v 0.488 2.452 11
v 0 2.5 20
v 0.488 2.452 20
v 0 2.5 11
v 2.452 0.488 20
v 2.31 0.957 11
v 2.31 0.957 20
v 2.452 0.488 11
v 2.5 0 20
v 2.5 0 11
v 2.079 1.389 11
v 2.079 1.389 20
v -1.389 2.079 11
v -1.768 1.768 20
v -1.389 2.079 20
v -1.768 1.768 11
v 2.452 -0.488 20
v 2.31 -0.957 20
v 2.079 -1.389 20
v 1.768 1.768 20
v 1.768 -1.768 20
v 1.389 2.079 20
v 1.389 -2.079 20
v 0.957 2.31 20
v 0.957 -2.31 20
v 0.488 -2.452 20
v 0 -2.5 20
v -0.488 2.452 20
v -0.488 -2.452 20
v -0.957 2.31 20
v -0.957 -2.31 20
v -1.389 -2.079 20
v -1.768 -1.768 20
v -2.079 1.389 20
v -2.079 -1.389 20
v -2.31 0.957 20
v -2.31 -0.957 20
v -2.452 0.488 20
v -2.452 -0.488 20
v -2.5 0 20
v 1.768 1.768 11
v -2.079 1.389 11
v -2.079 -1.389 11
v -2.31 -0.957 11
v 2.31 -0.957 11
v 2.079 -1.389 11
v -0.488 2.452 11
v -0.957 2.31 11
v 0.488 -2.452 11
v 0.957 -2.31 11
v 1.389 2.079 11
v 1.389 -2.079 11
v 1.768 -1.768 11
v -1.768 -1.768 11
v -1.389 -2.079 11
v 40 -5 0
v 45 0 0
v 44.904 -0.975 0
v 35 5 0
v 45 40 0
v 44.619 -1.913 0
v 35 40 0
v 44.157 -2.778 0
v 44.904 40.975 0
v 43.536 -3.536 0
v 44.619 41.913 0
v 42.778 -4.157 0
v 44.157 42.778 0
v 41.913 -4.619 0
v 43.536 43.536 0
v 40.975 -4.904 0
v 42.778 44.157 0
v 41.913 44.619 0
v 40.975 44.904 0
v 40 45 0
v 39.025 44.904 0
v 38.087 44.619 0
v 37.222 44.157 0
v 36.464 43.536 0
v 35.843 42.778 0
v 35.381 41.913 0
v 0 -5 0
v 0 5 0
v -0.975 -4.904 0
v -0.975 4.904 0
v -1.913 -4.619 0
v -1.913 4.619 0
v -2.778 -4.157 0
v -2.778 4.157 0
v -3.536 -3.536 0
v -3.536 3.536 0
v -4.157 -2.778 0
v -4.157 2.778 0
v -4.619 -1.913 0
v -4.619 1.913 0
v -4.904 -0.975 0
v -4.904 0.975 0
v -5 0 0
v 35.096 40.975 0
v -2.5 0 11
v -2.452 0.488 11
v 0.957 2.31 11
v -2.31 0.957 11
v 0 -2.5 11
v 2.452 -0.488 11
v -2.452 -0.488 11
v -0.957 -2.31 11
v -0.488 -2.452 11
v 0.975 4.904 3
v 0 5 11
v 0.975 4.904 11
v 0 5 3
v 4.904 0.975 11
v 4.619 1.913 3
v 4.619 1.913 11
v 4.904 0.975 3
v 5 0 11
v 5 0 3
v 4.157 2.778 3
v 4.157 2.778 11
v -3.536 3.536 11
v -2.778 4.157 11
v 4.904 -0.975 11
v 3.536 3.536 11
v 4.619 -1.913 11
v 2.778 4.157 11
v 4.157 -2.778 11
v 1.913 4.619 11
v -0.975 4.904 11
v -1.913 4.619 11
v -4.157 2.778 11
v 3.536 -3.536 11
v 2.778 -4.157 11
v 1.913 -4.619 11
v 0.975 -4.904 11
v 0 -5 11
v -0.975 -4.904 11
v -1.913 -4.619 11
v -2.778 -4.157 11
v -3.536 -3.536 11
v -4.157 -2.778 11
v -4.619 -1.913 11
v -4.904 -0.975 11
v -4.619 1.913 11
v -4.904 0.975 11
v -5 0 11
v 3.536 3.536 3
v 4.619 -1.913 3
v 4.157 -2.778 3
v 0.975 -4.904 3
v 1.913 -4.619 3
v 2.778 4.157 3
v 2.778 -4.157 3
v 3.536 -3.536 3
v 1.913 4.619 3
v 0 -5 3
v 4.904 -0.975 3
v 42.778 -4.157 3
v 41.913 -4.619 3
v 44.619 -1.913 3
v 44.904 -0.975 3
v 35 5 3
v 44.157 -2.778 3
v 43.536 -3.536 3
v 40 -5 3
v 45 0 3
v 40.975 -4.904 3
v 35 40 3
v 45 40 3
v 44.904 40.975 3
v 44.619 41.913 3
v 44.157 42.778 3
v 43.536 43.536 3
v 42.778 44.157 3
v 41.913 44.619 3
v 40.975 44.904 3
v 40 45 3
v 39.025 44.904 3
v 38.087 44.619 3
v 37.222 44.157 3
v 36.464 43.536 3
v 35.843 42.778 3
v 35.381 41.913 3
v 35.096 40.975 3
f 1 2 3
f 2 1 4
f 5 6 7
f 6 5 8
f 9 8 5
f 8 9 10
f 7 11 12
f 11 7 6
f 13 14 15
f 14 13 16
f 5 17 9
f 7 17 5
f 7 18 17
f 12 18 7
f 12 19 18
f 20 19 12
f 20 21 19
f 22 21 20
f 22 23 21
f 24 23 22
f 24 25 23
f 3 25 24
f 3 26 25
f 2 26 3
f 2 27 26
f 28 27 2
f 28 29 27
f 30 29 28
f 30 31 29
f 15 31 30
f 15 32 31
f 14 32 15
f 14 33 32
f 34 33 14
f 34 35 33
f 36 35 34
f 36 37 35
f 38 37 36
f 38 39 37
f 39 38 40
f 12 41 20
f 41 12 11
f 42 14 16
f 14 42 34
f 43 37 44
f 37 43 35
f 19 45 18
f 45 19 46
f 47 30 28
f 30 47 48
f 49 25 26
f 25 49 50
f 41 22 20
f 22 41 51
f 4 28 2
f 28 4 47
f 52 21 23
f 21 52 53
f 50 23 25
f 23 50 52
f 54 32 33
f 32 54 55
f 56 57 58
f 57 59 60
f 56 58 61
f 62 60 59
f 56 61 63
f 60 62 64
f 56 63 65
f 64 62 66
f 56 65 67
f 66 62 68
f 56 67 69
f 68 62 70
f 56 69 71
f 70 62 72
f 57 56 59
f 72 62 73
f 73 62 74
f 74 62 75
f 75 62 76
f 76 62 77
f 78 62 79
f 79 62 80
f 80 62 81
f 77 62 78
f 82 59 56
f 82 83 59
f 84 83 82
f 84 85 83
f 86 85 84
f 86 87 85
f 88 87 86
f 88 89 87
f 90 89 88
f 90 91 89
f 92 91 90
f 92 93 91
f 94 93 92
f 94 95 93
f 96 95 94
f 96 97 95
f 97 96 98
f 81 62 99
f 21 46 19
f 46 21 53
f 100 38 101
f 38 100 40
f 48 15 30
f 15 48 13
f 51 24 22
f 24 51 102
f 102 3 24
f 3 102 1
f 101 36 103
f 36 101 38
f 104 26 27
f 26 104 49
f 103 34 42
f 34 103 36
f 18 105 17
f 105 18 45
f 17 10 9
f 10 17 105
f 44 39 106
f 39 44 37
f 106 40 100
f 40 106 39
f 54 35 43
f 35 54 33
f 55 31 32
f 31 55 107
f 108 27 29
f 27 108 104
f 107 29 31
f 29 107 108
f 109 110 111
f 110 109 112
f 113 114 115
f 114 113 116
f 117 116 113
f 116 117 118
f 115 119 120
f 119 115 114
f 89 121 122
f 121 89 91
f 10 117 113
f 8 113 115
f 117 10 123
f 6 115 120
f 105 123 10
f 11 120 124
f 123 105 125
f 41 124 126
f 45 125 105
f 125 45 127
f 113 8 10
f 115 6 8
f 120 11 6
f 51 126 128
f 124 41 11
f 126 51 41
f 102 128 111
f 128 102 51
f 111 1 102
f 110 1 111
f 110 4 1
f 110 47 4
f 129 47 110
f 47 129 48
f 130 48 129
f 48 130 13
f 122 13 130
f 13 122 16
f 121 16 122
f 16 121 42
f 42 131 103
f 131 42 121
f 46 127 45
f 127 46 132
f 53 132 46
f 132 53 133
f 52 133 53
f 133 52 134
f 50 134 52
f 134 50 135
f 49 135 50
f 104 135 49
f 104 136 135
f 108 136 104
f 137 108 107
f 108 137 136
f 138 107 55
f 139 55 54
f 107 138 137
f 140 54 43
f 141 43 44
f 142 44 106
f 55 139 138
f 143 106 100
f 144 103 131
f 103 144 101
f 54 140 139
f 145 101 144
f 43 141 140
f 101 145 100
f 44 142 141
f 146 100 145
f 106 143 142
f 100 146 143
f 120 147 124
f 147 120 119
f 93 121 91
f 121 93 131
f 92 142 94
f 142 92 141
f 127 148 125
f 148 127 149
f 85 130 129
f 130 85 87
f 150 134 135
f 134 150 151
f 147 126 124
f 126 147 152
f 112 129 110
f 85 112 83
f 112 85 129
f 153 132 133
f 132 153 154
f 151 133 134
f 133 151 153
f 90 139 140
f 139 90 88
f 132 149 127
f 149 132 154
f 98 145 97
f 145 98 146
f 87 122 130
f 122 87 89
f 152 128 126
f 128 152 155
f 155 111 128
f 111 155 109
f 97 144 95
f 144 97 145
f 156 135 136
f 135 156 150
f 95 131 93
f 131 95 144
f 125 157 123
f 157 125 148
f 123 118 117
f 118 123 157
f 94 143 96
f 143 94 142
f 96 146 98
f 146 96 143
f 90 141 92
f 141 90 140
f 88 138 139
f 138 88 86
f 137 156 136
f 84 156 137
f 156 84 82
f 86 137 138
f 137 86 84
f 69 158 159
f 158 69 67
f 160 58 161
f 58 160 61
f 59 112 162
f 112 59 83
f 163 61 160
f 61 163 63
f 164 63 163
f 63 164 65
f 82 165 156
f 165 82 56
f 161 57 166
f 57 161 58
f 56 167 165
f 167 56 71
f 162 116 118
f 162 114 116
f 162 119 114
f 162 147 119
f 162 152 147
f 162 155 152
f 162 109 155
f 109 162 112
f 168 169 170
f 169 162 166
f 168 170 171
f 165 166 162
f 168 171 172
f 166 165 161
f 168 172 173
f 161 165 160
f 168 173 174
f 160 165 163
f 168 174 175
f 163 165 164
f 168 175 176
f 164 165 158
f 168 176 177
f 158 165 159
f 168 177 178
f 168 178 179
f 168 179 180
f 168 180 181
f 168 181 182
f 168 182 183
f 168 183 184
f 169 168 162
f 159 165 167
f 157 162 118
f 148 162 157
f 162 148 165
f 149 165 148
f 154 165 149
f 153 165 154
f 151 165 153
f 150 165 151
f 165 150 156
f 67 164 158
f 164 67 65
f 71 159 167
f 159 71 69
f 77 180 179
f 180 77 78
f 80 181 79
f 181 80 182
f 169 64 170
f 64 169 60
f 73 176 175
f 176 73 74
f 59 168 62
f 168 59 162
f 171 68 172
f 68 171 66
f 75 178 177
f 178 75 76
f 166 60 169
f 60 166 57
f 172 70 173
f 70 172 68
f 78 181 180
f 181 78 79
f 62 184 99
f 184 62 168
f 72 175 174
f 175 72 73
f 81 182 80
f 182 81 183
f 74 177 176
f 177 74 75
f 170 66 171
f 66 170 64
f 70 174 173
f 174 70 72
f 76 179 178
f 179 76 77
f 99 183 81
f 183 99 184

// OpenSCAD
/**
 * Martin Egli
 * 2022-08-03
 */

loc_res = 32;
translate([0, 0, 0])
cylinder(d = 5, h = 20, $fn = loc_res);
translate([0, 0, 0])
cylinder(d = 10, h = 11, $fn = loc_res);
hull() {
    translate([0, 0, 0])
    cylinder(d = 10, h = 3, $fn = loc_res);
    translate([40, 0, 0])
    cylinder(d = 10, h = 3, $fn = loc_res);
}
hull() {
    translate([40, 0, 0])
    cylinder(d = 10, h = 3, $fn = loc_res);
    translate([40, 40, 0])
    cylinder(d = 10, h = 3, $fn = loc_res);
}
